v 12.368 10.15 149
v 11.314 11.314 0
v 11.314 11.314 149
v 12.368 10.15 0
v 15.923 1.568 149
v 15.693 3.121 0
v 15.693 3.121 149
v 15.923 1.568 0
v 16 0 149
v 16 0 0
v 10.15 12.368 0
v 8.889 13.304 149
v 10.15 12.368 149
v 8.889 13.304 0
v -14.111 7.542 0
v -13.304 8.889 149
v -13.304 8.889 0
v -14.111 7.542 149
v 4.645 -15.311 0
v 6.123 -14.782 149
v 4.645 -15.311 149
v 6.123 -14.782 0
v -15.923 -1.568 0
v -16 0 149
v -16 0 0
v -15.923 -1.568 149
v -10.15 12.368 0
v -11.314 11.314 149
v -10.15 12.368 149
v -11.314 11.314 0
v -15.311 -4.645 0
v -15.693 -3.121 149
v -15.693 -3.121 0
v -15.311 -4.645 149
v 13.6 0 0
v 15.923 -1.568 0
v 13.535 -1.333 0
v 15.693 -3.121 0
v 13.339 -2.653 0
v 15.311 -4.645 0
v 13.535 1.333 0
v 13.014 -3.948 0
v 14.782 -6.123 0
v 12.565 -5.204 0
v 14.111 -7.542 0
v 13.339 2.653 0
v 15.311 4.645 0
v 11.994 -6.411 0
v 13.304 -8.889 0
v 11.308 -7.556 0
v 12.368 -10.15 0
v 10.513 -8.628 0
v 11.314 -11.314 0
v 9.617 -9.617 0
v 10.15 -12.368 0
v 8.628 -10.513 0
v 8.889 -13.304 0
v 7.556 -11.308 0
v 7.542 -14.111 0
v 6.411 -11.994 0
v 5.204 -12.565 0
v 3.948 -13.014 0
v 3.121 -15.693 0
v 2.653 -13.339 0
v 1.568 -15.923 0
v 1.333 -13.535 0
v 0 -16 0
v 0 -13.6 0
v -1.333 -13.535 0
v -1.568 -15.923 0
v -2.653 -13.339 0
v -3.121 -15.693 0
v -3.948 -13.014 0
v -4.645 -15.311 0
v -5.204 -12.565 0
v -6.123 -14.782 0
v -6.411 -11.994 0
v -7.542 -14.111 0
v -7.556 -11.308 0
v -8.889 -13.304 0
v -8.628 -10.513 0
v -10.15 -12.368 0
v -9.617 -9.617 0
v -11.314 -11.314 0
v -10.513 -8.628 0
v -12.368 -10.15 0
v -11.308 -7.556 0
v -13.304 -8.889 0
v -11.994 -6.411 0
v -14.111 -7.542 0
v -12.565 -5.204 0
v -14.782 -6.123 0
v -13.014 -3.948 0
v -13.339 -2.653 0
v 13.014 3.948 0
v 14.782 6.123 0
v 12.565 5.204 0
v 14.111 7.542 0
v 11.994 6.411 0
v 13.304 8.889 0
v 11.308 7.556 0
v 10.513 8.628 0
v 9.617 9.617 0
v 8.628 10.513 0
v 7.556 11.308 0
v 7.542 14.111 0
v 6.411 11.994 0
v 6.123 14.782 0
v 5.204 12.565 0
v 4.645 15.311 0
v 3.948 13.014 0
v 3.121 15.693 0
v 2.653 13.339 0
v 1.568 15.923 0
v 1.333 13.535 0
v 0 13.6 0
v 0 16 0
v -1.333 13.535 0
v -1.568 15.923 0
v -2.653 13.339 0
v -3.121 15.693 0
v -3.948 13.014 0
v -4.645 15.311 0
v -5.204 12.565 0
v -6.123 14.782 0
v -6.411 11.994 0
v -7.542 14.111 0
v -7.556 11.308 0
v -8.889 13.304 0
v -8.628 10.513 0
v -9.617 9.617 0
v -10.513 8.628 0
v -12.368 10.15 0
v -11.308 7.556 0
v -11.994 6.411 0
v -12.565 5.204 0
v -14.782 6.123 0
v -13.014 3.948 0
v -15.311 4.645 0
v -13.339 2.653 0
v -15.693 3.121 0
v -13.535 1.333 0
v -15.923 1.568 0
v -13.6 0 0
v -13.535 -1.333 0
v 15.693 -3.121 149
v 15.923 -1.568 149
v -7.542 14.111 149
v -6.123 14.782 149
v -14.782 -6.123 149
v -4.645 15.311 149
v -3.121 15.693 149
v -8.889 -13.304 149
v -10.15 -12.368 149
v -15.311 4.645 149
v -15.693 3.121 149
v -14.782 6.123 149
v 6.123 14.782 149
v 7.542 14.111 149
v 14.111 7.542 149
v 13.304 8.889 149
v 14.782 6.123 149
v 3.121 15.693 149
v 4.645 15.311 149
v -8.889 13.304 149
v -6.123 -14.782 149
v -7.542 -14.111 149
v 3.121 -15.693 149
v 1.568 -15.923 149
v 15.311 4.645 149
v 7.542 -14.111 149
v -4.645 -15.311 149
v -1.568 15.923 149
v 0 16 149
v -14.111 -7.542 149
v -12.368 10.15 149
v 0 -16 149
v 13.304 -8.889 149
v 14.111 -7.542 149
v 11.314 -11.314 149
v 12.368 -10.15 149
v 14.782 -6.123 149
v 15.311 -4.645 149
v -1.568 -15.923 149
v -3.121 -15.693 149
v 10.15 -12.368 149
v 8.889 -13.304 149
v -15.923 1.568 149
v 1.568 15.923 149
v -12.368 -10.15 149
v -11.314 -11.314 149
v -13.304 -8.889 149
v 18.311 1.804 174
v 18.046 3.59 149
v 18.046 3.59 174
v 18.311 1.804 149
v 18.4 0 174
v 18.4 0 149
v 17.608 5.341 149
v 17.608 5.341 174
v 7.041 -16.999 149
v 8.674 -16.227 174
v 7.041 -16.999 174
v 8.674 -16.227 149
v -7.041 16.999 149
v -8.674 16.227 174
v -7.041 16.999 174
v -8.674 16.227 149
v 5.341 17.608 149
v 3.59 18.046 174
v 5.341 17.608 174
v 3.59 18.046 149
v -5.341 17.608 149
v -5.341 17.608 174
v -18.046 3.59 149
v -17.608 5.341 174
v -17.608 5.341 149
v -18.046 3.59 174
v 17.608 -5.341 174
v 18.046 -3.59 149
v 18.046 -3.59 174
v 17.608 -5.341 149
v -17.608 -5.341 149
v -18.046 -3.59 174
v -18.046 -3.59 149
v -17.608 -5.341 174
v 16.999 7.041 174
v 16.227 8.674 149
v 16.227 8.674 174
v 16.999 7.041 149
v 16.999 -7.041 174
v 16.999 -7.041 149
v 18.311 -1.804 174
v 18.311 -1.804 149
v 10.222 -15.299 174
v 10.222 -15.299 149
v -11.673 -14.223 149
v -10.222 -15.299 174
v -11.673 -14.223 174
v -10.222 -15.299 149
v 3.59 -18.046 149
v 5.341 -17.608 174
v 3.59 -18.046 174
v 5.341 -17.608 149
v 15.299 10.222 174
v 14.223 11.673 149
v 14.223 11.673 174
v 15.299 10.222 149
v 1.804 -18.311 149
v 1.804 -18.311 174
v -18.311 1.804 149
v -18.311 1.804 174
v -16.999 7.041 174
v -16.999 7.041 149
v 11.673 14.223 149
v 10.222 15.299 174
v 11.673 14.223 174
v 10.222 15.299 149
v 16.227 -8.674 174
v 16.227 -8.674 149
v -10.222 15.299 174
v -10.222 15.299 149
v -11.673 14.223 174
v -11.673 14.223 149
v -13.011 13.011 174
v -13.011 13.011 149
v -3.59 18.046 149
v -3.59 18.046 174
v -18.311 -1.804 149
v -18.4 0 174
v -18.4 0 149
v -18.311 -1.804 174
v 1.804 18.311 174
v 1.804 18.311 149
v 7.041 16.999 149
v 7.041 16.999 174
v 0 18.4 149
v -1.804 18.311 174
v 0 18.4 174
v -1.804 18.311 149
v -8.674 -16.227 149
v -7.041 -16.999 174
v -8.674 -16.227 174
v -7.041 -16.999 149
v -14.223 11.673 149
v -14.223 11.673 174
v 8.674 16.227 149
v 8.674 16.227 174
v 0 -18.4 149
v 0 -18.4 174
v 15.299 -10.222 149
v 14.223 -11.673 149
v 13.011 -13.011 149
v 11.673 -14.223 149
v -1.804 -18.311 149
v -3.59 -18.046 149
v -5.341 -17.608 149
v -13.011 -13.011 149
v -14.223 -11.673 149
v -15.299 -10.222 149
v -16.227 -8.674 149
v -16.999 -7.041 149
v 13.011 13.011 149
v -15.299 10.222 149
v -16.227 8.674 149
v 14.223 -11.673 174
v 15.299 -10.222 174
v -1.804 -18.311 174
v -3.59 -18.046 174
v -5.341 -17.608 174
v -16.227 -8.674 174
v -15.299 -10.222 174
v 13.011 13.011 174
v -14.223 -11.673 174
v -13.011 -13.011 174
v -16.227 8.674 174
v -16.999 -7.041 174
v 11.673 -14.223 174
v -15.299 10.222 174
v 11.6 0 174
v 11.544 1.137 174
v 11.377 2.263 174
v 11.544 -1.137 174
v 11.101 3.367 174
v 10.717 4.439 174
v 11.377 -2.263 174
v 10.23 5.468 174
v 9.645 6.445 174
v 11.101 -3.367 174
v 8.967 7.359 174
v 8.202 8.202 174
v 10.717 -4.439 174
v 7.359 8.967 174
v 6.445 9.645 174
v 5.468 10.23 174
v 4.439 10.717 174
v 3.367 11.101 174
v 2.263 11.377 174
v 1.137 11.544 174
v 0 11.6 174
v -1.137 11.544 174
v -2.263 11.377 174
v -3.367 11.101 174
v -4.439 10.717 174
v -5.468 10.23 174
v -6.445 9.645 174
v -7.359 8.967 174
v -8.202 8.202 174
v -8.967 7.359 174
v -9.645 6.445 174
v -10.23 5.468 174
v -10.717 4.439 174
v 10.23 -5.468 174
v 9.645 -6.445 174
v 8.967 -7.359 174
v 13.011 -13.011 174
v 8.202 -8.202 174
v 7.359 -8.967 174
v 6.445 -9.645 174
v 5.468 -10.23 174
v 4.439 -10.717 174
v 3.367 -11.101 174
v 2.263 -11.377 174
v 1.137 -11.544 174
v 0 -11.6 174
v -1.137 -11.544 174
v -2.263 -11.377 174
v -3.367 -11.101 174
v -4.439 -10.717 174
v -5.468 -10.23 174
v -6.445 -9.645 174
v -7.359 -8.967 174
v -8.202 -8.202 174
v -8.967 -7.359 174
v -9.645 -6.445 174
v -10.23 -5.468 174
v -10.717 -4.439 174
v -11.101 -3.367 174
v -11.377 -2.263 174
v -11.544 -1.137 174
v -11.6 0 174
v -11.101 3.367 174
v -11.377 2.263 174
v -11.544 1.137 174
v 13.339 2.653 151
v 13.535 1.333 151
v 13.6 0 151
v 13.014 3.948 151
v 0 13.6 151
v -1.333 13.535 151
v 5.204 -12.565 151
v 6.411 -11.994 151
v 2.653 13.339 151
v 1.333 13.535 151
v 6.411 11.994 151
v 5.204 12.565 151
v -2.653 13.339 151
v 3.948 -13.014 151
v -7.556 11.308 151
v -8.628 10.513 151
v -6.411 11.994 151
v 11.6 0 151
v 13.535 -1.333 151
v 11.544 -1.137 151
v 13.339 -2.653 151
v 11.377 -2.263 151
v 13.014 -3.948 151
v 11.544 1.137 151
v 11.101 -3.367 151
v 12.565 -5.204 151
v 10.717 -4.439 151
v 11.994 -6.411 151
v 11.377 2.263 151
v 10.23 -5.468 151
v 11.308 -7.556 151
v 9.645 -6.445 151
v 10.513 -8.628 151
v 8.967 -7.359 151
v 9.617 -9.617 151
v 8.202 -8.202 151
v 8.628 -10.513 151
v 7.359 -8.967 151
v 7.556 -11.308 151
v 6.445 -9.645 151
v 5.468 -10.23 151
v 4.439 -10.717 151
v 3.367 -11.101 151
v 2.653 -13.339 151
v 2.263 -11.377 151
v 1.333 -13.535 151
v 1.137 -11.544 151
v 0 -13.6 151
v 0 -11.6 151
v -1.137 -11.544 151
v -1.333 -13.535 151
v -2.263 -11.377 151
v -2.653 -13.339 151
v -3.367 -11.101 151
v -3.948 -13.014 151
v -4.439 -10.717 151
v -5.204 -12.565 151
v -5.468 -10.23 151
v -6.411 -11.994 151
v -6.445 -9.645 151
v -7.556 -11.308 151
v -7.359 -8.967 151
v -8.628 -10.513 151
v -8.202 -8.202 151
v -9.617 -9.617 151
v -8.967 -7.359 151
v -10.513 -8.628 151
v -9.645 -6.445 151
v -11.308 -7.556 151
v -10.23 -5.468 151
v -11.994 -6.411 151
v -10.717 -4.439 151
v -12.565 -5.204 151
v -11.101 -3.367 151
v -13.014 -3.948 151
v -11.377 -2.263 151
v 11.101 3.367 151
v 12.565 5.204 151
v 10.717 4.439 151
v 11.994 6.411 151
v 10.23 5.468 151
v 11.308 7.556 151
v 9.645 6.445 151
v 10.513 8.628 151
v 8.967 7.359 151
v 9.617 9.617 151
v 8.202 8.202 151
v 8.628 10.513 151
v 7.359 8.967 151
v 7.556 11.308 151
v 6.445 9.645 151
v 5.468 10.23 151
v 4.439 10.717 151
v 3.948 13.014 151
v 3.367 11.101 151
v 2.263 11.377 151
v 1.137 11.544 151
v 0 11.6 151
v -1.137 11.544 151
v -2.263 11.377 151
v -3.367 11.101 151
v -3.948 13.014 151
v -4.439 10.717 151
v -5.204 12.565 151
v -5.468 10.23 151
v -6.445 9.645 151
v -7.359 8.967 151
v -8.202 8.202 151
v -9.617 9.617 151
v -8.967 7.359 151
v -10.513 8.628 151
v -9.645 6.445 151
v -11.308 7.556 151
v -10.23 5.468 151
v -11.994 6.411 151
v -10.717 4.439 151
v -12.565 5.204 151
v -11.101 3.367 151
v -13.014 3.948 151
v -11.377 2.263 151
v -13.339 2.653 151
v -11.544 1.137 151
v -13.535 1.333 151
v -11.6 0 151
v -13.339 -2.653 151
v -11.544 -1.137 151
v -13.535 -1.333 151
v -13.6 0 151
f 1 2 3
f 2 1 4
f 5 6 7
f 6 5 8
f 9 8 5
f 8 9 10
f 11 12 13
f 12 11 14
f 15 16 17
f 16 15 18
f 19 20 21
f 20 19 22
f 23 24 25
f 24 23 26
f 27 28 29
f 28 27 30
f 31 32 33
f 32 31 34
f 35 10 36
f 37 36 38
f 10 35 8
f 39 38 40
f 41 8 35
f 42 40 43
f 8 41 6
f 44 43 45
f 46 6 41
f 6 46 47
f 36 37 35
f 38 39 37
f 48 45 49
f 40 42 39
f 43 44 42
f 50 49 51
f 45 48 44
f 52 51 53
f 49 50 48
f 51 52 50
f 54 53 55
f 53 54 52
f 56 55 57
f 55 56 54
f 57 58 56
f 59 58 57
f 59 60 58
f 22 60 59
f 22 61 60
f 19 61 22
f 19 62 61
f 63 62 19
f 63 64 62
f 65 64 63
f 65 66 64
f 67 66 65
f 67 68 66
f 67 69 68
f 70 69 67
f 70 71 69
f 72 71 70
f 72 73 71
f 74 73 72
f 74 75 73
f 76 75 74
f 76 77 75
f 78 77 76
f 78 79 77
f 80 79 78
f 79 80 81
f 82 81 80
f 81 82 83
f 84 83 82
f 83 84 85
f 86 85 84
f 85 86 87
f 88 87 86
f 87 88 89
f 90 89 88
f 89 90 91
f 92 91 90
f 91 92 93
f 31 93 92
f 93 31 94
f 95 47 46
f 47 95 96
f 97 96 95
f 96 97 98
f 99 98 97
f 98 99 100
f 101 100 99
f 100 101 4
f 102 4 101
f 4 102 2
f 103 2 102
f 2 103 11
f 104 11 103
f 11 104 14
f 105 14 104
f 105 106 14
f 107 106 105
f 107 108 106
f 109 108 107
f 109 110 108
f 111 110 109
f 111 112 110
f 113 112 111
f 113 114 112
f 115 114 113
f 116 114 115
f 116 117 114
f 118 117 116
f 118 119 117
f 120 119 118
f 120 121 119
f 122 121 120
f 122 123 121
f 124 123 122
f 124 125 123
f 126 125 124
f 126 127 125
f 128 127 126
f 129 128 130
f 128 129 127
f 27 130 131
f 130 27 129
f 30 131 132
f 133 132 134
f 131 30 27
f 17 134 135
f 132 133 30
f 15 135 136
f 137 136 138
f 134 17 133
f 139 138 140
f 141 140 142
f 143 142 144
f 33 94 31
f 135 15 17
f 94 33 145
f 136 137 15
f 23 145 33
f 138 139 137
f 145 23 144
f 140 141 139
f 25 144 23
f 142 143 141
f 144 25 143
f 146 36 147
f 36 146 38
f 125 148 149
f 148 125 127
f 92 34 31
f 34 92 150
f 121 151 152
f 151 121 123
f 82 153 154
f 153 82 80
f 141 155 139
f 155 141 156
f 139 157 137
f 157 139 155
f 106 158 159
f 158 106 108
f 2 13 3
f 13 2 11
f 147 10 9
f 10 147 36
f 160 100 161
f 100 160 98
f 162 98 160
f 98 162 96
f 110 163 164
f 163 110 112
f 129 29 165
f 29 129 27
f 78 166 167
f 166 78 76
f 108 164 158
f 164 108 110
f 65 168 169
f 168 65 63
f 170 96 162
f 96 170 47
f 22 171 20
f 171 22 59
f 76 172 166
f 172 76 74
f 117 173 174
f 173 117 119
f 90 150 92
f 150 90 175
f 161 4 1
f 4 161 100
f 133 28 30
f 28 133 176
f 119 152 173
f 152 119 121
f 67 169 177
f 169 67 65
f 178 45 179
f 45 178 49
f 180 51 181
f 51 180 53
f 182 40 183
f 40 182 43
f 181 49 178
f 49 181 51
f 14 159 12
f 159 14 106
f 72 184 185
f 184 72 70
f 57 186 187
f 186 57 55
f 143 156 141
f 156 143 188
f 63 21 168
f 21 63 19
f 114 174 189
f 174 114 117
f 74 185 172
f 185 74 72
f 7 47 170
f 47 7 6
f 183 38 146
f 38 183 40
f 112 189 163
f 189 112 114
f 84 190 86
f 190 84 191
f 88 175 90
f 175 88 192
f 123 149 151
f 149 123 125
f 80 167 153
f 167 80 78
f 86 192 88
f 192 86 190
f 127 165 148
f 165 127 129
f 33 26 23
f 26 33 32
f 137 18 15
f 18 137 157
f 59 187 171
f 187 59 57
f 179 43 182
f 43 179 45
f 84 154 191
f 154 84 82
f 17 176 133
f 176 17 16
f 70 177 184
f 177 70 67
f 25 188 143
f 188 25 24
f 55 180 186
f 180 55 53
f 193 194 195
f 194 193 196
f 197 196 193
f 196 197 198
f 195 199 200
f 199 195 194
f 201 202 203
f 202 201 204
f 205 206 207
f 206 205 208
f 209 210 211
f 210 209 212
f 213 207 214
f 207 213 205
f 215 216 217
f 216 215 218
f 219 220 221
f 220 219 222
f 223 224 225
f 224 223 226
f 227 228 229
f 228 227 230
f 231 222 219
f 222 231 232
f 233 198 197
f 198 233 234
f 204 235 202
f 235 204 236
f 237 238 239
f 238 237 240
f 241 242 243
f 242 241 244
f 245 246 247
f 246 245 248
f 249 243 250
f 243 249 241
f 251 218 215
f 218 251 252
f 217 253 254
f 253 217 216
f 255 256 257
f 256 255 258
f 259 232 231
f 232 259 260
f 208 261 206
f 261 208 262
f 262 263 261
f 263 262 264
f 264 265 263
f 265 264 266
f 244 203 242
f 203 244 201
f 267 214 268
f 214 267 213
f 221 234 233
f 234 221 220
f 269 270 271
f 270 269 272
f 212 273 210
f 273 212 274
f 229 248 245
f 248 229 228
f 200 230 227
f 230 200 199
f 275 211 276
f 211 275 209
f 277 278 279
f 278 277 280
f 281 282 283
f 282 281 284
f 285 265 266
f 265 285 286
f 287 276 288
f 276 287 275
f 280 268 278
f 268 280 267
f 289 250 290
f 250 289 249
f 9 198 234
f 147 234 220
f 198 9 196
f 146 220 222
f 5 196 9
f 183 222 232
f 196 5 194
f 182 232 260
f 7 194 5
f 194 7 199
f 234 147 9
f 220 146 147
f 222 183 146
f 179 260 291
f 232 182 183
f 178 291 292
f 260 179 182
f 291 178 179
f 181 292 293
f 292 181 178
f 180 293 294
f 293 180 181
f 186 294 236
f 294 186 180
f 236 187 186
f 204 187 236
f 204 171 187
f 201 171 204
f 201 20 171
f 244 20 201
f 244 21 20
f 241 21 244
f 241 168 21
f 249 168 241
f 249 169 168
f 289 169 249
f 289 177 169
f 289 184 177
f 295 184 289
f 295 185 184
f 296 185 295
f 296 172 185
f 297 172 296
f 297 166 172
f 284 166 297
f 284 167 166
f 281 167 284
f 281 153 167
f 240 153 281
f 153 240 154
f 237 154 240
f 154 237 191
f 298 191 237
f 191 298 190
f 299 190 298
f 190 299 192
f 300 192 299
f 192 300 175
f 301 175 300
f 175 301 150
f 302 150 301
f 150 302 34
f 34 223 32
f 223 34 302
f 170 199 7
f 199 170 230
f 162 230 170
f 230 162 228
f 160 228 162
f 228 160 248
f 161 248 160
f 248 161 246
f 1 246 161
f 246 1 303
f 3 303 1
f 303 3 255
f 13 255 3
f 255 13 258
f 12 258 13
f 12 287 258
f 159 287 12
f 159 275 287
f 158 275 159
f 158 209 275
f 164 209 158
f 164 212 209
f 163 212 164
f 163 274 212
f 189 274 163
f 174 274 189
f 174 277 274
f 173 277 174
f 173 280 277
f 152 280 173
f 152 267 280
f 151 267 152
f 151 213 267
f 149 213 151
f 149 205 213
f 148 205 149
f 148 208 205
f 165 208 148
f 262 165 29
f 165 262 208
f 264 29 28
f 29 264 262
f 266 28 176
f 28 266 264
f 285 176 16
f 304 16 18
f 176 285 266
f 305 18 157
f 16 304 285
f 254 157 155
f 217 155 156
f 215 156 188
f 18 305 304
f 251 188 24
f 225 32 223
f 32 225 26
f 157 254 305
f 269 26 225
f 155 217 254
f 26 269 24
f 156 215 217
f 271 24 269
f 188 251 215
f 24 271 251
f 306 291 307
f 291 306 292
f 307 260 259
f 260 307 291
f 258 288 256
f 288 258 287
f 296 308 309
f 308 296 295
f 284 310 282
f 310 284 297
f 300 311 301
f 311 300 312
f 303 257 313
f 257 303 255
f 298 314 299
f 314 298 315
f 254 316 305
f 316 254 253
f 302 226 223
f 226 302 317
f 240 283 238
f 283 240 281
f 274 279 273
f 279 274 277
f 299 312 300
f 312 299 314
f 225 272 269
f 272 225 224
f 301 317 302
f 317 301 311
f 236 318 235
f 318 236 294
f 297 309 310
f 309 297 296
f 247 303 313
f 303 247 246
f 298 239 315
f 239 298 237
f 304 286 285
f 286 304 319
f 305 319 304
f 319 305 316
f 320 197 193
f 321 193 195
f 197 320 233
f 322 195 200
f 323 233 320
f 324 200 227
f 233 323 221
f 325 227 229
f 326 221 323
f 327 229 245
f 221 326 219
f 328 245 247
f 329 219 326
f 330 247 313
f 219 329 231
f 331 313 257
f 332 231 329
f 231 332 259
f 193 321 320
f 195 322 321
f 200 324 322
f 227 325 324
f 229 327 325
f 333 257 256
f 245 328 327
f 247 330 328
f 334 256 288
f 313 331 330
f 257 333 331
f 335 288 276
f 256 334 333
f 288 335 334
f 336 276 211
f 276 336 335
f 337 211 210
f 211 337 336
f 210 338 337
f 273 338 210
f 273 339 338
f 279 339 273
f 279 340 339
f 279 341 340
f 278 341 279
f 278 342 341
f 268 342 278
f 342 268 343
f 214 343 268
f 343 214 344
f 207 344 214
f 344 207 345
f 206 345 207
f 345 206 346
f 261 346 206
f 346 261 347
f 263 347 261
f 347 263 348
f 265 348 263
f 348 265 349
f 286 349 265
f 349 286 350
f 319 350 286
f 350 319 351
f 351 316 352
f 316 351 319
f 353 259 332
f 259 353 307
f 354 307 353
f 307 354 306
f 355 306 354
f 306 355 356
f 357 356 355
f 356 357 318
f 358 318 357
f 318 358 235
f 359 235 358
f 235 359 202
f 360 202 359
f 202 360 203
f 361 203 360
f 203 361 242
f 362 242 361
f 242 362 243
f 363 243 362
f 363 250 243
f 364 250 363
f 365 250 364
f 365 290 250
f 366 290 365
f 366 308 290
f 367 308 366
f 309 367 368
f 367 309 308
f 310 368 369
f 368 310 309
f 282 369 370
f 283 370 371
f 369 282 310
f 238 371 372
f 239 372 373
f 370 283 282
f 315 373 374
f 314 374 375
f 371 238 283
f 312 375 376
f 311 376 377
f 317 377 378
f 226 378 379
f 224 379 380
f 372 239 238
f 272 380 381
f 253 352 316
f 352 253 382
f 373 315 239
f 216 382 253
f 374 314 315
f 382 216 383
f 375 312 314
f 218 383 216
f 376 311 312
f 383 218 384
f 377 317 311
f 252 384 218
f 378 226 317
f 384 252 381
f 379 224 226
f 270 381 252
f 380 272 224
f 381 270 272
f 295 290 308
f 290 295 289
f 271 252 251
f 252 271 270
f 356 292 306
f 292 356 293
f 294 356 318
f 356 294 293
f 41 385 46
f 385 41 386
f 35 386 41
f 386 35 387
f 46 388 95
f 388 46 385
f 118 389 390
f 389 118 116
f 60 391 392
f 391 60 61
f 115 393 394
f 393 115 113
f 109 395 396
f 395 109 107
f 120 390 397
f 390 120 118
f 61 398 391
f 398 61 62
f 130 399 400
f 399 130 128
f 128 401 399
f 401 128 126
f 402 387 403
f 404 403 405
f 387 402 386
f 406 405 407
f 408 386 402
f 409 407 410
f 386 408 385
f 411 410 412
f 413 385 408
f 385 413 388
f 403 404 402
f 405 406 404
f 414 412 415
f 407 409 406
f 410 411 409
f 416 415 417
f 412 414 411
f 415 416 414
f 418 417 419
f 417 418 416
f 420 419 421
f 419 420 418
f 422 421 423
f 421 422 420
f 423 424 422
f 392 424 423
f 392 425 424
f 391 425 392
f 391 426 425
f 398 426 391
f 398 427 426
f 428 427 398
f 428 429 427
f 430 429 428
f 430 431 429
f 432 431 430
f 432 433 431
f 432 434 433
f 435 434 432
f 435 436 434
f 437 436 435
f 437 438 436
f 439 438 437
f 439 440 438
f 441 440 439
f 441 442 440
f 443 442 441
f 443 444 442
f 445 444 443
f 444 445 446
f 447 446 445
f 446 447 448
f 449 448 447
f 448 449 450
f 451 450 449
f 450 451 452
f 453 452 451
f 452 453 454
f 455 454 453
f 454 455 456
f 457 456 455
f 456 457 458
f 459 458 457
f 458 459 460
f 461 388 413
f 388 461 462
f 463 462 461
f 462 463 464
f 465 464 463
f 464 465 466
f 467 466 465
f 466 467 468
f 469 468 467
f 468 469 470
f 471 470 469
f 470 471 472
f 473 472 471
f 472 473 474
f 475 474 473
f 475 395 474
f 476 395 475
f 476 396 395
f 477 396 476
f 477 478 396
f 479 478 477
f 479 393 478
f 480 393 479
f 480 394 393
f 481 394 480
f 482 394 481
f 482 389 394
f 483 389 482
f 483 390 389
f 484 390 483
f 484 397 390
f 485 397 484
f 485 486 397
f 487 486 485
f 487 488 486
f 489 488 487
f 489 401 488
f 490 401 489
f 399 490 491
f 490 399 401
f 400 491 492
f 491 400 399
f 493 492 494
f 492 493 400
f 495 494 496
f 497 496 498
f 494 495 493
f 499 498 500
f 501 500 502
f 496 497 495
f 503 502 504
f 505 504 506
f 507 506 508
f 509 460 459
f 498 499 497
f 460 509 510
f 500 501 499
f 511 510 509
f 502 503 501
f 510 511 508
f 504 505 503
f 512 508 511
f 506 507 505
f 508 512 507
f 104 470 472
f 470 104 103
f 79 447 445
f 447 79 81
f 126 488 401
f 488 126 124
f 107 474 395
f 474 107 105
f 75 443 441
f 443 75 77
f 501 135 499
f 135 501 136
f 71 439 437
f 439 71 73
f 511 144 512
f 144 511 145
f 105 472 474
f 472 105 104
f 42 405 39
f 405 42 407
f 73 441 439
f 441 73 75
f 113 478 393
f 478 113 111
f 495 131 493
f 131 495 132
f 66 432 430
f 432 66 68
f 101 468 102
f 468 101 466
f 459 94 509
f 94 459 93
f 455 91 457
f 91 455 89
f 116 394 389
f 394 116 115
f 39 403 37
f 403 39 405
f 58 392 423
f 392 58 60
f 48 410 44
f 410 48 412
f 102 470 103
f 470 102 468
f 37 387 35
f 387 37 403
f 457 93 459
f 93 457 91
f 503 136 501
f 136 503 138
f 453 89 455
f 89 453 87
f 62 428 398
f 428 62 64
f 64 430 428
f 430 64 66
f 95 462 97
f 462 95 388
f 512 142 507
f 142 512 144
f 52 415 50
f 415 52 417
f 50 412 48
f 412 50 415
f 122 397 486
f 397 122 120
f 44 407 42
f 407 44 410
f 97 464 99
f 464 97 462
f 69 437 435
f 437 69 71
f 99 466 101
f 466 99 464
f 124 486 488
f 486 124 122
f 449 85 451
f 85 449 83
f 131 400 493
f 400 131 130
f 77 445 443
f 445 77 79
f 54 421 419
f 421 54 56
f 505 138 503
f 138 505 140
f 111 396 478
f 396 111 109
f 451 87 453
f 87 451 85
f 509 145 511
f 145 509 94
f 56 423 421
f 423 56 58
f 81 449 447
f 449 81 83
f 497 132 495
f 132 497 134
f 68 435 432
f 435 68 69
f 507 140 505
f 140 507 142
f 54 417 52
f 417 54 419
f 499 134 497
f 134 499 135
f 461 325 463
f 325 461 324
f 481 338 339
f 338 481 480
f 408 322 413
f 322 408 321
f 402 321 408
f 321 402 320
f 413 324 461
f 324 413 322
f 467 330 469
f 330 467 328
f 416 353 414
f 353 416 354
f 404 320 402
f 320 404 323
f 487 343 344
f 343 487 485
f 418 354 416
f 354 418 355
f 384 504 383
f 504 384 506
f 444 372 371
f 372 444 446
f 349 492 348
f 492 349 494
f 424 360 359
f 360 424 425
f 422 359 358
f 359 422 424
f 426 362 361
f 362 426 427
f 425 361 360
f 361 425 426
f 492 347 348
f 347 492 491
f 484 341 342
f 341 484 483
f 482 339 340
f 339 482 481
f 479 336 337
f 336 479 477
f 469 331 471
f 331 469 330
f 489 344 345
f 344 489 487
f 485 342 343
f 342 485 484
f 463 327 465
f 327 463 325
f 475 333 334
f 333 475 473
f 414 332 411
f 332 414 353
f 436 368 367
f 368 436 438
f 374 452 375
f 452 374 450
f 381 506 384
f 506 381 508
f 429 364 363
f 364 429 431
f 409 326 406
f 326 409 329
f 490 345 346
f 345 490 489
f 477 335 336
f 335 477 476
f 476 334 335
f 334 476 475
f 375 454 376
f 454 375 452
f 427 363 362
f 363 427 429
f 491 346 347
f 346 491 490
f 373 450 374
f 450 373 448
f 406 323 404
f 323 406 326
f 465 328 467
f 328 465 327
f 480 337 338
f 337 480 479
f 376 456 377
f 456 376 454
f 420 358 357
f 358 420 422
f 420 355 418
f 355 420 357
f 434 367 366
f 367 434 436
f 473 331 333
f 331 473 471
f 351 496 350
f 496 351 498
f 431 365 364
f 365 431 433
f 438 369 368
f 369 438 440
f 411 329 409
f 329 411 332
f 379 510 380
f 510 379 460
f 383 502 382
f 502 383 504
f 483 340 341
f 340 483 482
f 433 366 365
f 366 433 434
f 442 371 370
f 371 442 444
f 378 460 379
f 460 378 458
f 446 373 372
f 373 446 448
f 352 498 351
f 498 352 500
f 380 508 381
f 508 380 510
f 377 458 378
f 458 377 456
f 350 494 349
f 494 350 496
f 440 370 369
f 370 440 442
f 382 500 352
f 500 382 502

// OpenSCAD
// Parameters
pipe_standard = 1; //[1:1:1]
nominal_diameter = 32; //[16:64:1]
length_mm = 150; //[75:300:1]
center = 0; //[0:1:1]
od_mm = 32; //[16:64:0.5]
wall_mm = 2.4; //[1.2:4.8:0.1]
fitting_length_mm = 25; //[12:50:1]
fitting_od_scale = 1.15; //[1.05:1.35:0.01]
fitting_socket_wall_mm = 2.0; //[1.0:4.0:0.1]
connect_overlap_mm = 1; //[0.5:2:0.1]

// Module for HT Pipe
module ht_pipe() {
  color([0.85, 0.85, 0.8]) {
    difference() {
      // Outer pipe with end fitting
      union() {
        // Main pipe segment
        translate([0, 0, 0])
          cylinder(h=length_mm, r=od_mm/2, center=false, $fn=64);
        // End fitting
        translate([0, 0, length_mm - connect_overlap_mm])
          cylinder(h=fitting_length_mm, r=(od_mm*fitting_od_scale)/2, center=false, $fn=64);
      }
      // Hollow bore
      translate([0, 0, -connect_overlap_mm])
        cylinder(h=length_mm + 2*connect_overlap_mm, r=od_mm/2 - wall_mm, center=false, $fn=64);
      // End fitting socket bore
      translate([0, 0, length_mm - connect_overlap_mm - connect_overlap_mm])
        cylinder(h=fitting_length_mm + 2*connect_overlap_mm, r=od_mm/2 - wall_mm - fitting_socket_wall_mm, center=false, $fn=64);
    }
  }
}

// Assembly
module assembly() {
  ht_pipe();
}

assembly();
